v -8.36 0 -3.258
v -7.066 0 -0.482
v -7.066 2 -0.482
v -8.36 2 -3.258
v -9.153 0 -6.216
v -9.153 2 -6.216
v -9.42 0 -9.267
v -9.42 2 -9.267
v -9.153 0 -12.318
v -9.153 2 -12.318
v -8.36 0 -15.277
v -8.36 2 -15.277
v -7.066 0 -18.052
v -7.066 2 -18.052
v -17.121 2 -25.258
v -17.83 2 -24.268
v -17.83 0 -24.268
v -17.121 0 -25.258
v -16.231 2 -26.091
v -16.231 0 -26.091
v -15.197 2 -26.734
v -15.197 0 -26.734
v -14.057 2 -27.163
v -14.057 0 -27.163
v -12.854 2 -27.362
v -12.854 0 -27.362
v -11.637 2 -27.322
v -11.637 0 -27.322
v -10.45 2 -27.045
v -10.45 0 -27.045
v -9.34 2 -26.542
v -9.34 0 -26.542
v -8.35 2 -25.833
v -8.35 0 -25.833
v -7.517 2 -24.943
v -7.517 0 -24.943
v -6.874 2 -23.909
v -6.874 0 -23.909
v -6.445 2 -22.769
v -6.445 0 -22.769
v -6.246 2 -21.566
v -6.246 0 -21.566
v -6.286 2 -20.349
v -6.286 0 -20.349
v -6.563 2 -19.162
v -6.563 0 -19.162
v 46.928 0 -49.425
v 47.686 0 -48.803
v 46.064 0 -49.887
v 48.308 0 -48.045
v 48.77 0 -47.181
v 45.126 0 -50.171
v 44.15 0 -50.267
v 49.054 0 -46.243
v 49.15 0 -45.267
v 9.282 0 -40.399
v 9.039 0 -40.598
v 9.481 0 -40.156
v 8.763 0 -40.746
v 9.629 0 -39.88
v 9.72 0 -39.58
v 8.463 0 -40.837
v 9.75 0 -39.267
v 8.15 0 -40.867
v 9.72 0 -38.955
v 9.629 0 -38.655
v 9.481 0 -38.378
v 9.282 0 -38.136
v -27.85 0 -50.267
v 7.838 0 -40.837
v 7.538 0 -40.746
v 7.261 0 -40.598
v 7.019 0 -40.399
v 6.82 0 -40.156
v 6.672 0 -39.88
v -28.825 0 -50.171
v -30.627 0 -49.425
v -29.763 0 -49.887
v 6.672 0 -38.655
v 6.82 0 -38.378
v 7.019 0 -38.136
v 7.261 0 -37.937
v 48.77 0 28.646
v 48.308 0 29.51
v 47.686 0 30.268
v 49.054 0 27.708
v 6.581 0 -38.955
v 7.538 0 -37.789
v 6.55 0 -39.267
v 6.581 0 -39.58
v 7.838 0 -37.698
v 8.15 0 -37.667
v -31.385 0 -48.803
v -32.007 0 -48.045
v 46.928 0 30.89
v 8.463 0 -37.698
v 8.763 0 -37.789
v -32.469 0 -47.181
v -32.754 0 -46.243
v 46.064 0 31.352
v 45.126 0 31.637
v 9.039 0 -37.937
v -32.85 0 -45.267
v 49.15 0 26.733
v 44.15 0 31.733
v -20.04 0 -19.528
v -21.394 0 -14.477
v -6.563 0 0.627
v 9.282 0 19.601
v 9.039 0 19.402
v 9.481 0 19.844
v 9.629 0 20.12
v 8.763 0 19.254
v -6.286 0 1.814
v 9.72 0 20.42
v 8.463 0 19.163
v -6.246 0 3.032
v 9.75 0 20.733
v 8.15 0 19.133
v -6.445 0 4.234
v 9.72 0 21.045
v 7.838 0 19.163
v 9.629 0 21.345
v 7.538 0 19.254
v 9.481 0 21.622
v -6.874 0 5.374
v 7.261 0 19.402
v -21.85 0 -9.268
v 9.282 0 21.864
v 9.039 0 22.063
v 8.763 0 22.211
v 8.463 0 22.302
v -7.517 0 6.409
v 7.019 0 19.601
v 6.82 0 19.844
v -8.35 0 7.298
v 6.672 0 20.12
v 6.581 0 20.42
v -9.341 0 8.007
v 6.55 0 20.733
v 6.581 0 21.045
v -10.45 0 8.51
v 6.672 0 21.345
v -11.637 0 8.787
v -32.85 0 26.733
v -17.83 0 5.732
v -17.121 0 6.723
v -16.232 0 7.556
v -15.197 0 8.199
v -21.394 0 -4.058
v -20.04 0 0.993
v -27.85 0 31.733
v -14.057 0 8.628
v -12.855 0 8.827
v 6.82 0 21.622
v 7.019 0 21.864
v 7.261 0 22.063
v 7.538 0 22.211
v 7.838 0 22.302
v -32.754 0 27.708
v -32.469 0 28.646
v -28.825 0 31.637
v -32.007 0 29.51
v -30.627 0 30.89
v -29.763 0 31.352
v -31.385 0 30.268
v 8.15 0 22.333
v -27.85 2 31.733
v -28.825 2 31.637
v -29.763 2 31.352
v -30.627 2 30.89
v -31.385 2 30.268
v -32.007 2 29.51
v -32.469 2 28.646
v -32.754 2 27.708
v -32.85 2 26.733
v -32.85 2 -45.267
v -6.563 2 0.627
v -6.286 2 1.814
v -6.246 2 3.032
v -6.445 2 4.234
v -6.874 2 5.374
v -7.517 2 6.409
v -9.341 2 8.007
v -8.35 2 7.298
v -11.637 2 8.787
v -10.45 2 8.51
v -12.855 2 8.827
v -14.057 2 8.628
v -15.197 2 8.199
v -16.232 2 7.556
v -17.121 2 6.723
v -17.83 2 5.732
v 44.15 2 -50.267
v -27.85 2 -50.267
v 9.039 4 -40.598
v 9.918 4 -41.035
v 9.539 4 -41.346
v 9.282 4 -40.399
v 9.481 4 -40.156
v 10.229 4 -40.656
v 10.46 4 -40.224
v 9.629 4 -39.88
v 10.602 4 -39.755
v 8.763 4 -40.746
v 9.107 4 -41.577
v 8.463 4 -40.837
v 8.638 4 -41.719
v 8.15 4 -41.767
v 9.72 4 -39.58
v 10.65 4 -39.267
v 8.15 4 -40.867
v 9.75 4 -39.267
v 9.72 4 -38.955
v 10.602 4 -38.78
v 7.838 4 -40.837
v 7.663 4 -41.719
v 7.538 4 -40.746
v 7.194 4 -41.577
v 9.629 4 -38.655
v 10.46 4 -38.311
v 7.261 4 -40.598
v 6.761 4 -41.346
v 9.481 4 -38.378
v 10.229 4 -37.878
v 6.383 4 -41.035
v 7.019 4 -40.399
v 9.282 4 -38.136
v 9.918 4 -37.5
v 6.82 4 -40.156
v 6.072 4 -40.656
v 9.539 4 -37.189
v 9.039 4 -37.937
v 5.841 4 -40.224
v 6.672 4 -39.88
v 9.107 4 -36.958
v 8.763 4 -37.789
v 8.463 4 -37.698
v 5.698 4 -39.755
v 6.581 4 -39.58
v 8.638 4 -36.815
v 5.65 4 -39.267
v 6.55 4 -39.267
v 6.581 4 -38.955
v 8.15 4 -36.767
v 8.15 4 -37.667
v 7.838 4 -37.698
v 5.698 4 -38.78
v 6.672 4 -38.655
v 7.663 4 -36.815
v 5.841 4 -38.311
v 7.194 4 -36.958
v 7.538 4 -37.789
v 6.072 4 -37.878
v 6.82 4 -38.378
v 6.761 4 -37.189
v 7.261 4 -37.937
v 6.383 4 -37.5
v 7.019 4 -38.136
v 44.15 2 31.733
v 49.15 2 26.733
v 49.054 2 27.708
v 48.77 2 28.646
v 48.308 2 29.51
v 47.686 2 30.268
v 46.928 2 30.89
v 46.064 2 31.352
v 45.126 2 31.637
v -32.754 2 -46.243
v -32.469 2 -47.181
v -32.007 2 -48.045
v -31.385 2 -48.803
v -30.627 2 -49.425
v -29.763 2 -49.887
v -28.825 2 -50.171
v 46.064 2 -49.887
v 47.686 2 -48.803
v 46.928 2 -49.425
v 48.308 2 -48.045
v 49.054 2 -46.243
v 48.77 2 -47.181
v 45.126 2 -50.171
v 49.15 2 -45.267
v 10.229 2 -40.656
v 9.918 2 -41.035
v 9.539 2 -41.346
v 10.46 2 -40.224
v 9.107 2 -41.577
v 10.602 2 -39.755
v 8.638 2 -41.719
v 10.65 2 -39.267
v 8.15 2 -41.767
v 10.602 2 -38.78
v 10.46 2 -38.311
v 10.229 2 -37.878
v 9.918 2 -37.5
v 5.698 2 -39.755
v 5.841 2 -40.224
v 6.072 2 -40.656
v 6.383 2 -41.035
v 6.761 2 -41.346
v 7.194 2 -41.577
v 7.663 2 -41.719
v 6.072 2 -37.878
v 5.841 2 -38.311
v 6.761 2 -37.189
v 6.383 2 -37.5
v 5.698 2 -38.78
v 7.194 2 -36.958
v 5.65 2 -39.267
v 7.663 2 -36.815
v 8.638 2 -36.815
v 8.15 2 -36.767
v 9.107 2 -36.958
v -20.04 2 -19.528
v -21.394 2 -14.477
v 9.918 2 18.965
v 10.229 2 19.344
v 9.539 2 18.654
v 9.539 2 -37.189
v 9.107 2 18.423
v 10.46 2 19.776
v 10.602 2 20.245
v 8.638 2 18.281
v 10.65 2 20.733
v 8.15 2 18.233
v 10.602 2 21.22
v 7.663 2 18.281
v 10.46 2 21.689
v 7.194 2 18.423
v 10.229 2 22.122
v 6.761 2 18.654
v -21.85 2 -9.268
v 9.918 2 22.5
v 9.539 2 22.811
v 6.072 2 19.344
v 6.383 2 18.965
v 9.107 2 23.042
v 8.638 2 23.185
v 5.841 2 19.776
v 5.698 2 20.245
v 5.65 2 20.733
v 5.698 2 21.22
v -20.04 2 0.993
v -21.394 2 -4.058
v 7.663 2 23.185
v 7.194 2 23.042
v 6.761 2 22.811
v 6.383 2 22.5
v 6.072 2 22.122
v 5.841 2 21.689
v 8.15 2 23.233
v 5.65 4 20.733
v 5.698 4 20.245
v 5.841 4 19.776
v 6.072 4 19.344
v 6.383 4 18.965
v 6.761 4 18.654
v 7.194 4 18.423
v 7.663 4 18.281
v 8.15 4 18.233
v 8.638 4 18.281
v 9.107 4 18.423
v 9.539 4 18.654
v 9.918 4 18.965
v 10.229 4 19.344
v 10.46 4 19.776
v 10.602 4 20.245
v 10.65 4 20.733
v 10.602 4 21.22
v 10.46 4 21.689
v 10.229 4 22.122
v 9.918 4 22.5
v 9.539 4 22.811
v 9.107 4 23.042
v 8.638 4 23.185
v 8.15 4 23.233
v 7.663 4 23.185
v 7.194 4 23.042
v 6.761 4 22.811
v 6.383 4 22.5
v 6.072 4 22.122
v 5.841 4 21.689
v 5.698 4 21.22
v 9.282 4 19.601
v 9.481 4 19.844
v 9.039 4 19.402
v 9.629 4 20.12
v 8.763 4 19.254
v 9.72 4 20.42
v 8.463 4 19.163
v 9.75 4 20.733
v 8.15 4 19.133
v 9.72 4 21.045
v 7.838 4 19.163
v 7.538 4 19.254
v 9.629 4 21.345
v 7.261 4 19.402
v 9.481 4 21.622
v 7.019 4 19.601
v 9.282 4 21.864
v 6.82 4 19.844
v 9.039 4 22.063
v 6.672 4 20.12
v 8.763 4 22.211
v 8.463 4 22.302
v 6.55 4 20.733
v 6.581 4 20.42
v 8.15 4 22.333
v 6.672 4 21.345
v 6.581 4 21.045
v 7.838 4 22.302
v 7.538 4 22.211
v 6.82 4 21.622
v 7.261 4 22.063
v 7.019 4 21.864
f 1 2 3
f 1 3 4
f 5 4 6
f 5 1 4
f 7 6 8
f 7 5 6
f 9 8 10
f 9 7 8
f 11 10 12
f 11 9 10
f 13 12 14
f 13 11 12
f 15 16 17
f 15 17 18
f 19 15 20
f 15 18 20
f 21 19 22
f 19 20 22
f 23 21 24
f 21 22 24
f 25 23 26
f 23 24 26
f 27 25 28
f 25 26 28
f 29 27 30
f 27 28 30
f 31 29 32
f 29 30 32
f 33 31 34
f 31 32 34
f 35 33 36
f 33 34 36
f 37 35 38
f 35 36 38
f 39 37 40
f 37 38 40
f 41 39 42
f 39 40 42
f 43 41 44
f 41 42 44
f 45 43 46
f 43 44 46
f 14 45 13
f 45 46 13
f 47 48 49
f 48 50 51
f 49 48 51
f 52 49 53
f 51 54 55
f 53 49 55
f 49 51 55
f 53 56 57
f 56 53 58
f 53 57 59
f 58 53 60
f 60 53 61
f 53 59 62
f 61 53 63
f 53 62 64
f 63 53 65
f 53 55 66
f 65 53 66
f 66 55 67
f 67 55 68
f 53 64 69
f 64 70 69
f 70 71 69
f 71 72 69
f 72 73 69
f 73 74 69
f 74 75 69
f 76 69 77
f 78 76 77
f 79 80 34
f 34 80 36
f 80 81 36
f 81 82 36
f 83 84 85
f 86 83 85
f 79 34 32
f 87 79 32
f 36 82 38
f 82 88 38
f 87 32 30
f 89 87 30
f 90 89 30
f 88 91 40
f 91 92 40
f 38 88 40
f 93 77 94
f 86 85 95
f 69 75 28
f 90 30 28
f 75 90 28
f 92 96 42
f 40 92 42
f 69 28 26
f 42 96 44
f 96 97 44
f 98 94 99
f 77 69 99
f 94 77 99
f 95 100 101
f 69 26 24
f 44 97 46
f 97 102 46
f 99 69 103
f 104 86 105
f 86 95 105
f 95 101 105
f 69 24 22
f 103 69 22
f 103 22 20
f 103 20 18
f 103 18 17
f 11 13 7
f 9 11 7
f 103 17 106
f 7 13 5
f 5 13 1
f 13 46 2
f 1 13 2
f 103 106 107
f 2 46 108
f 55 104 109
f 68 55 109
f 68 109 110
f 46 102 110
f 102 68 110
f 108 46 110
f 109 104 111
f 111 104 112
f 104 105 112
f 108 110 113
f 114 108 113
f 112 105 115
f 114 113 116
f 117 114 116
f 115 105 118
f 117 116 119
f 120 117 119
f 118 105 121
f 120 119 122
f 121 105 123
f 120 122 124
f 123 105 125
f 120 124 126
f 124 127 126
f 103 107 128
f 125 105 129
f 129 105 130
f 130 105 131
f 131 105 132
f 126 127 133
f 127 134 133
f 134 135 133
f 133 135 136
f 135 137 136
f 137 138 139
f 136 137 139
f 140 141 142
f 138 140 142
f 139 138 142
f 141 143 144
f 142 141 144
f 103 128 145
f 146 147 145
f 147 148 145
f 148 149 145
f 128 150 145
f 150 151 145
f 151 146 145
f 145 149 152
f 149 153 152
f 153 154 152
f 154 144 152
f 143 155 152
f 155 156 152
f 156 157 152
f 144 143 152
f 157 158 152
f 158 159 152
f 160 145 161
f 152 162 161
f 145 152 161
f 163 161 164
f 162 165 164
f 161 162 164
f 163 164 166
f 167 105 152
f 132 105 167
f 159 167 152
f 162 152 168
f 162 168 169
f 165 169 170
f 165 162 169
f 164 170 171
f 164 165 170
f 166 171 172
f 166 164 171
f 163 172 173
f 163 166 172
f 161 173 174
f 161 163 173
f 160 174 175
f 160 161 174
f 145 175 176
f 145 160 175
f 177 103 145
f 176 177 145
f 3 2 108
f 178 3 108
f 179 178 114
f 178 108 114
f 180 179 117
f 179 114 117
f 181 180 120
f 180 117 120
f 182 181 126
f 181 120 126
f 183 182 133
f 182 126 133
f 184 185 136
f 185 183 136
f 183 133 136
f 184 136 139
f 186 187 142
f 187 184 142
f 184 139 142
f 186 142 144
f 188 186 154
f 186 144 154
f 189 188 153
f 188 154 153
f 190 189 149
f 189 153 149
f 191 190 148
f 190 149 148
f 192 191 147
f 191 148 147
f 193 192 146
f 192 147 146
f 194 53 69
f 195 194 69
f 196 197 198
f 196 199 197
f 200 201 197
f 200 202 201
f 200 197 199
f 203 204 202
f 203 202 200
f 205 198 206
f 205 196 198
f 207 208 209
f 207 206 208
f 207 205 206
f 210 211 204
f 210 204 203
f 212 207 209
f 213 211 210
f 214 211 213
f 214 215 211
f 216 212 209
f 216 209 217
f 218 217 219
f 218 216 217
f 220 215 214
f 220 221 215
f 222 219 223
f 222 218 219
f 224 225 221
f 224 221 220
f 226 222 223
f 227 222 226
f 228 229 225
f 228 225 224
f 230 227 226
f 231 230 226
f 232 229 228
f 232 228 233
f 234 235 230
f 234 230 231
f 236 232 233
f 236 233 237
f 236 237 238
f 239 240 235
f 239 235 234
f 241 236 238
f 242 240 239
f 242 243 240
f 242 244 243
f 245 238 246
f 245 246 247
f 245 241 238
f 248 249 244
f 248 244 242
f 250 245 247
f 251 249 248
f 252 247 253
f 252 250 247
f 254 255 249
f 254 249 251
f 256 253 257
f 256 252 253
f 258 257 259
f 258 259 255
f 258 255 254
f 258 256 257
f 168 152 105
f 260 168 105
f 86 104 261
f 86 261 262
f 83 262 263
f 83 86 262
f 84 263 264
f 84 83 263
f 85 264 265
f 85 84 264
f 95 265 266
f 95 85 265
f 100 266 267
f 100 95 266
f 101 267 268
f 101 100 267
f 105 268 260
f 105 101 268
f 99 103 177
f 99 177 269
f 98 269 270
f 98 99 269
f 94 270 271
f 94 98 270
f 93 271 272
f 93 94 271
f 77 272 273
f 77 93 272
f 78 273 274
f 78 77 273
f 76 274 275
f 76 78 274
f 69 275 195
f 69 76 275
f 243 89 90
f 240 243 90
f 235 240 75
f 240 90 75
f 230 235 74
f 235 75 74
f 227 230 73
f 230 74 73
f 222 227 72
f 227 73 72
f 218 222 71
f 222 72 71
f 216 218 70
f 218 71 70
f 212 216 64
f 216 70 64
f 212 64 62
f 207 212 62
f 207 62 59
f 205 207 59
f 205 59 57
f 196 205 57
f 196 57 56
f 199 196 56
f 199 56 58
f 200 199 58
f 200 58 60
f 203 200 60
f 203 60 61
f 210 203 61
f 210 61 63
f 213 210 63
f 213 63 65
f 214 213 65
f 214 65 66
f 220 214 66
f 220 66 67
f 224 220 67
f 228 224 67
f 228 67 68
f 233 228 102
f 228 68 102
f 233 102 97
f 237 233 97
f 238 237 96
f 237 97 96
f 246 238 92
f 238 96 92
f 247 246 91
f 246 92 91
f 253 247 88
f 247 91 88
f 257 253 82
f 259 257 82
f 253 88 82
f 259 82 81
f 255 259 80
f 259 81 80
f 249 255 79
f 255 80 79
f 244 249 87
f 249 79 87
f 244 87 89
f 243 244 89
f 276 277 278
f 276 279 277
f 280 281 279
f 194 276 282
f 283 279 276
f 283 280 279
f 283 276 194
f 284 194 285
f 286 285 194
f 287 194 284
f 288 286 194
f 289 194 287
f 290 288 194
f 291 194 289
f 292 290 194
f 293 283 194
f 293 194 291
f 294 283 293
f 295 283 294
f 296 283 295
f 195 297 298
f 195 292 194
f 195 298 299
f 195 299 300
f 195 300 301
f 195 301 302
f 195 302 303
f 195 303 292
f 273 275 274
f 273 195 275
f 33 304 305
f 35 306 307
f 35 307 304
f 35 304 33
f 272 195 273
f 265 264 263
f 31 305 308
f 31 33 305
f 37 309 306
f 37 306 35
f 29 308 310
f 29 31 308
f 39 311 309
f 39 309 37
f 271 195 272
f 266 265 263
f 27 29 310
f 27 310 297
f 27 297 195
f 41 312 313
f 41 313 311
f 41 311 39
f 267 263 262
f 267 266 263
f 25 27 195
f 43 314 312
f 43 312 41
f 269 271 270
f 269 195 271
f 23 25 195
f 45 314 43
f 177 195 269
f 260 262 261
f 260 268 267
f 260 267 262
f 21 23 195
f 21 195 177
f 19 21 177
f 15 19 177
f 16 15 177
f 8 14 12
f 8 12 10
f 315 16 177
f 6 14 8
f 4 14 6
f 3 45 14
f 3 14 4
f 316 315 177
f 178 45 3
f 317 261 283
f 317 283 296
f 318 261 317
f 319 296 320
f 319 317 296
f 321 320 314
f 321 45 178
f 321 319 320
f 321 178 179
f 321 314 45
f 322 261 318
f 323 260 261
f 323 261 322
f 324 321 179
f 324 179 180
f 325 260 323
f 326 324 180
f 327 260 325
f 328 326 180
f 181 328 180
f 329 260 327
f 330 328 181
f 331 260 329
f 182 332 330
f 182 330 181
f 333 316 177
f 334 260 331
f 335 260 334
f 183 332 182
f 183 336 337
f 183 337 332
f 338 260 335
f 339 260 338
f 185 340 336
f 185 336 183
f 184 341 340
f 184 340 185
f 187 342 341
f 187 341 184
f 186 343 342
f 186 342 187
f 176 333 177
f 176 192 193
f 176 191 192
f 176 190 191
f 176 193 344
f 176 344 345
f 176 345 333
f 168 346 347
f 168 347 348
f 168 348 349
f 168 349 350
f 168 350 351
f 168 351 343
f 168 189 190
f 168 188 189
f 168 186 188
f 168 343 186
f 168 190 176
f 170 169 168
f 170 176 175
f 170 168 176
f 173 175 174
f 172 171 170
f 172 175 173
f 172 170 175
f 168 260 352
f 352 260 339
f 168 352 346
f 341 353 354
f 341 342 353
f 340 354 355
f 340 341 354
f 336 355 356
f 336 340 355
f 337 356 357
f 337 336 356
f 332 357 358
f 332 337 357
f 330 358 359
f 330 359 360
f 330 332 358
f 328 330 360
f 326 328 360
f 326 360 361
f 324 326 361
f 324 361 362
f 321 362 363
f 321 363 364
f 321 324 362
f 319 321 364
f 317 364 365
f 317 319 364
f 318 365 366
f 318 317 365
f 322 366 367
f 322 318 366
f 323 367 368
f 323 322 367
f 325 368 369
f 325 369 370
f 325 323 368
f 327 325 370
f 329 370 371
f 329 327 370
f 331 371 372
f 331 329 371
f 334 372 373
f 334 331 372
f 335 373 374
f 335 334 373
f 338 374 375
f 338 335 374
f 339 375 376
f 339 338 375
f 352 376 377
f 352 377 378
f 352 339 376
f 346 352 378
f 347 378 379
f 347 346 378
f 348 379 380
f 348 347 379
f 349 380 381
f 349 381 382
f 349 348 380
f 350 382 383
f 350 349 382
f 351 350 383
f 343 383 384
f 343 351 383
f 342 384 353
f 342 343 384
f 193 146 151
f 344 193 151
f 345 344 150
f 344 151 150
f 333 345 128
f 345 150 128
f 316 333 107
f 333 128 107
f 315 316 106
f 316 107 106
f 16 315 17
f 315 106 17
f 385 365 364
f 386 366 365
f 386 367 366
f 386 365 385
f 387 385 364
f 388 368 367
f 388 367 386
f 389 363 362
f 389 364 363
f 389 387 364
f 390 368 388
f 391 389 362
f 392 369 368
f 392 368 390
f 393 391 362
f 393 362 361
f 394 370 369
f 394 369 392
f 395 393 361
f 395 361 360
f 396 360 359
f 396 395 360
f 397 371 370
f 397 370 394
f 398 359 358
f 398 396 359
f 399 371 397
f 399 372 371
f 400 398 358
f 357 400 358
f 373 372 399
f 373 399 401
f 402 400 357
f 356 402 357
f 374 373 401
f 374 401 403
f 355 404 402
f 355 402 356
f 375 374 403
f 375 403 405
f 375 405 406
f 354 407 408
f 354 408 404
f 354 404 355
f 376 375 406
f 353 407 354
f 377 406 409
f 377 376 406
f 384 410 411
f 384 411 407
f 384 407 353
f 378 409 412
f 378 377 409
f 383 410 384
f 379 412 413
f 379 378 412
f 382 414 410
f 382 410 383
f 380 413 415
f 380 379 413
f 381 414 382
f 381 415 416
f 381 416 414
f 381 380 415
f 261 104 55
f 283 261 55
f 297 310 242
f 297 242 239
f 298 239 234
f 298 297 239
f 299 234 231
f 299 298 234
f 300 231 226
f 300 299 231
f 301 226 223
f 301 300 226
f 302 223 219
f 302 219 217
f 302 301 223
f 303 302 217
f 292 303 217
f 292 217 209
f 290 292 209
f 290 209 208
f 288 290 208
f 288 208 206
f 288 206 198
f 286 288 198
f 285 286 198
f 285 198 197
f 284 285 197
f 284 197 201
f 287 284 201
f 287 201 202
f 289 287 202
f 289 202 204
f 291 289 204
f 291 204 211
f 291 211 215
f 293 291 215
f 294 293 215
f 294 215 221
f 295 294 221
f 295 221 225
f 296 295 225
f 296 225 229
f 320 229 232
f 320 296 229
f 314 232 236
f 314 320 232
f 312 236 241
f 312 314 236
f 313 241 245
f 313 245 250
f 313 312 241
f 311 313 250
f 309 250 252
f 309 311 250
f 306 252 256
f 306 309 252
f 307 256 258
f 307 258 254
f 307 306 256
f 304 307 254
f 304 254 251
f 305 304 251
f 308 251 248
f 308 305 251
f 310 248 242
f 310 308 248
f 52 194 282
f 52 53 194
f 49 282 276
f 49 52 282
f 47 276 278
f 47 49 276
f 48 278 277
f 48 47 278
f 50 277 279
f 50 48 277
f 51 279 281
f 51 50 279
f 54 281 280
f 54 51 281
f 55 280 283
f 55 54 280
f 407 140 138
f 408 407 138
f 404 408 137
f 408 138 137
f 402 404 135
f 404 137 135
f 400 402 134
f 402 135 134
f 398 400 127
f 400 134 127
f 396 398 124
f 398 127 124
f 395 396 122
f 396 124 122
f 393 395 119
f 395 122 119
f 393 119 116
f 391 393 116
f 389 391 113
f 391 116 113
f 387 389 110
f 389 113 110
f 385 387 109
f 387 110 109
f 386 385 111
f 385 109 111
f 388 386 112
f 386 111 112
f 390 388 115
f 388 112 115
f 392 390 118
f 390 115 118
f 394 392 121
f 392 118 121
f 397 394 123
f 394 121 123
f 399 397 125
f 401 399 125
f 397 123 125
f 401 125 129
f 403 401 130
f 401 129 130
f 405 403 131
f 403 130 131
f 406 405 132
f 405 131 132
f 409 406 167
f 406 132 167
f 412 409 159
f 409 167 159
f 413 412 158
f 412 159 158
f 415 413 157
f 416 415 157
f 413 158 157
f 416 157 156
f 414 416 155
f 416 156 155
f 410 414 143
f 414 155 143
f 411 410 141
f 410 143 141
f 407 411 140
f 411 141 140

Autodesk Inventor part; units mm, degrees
ref_plane "YZ Plane" through (0, 0, 0) normal (1, 0, 0) x (0, 1, 0)
ref_plane "XZ Plane" through (0, 0, 0) normal (0, 1, 0) x (-1, 0, 0)
ref_plane "XY Plane" through (0, 0, 0) normal (0, 0, 1) x (1, 0, 0)
sketch "Sketch1" plane through (0, 0, 0) normal (0, 1, 0) x (-1, 0, 0)
  line L0 (32.8496, 31.7326) -> (-49.1504, 31.7326)
  line L1 (-49.1504, 31.7326) -> (-49.1504, -50.2674)
  line L2 (-49.1504, -50.2674) -> (32.8496, -50.2674)
  line L3 (32.8496, -50.2674) -> (32.8496, 31.7326)
  circle A0 centre (-8.1504, -9.2674) radius 30
  circle A1 centre (-8.1504, -39.2674) radius 2.5
  circle A2 centre (-8.1504, 20.7326) radius 2.5
  circle A3 centre (-8.1504, -39.2674) radius 1.6
  circle A4 centre (-8.1504, 20.7326) radius 1.6
  arc A5 (12.448, -21.16) -> (12.4481, 2.625) centre (-8.1504, -9.2674) ccw construction
  arc A6 (17.8304, -24.2675) -> (17.8305, 5.7325) centre (-8.1504, -9.2674) ccw
  arc A7 (7.0656, -18.0524) -> (7.0657, -0.4825) centre (-8.1504, -9.2674) ccw
  arc A8 (7.0656, -18.0524) -> (17.8304, -24.2675) centre (12.448, -21.16) ccw
  arc A9 (17.8305, 5.7325) -> (7.0657, -0.4825) centre (12.4481, 2.625) ccw
  line L4 (-8.1504, -9.2674) -> (12.448, -21.16) construction
  line L5 (-8.1504, -9.2674) -> (12.4481, 2.625) construction
  point P0 (0, 0)
  point P1 (17.8304, -24.2675)
  point P2 (17.8305, 5.7325)
  dimension "d0" = 82
  dimension "d1" = 82
  dimension "d2" = 60
  dimension "d3" = 5
  dimension "d4" = 5
  dimension "d5" = 3.2
  dimension "d6" = 3.2
  dimension "d7" = 60
extrude "Extrusion1" add sketch "Sketch1" along normal blind 2 contours L3 L2 L1 L0 | A9 A7 A8 A0 A1 A2
extrude "Extrusion2" add sketch "Sketch1" along normal blind 4 contours A2 A0 A4 | A0 A4 A2 | A1 A0 A3 | A0 A3 A1
sketch "Sketch2" plane through (0, 2, 0) normal (0, 1, 0) x (1, 0, 0)
  line L0 (49.1504, -31.7326) -> (49.1504, 50.2674) projected
  line L1 (49.1504, 50.2674) -> (-32.8496, 50.2674) projected
  line L2 (-32.8496, 50.2674) -> (-32.8496, -31.7326) projected
  line L3 (-32.8496, -31.7326) -> (49.1504, -31.7326) projected
  circle A0 centre (8.1504, -20.7326) radius 2.5 projected
  circle A1 centre (8.1504, 39.2674) radius 2.5 projected
  arc A2 (-7.0656, 18.0524) -> (-17.8304, 24.2675) centre (-12.448, 21.16) ccw projected
  arc A3 (-7.0656, 18.0524) -> (-7.0657, 0.4825) centre (8.1504, 9.2674) ccw projected
  arc A4 (-17.8305, -5.7325) -> (-7.0657, 0.4825) centre (-12.4481, -2.625) ccw projected
  arc A5 (-17.8304, 24.2675) -> (-17.8305, -5.7325) centre (8.1504, 9.2674) ccw projected
  circle A6 centre (-27.8496, 45.2674) radius 5
  circle A7 centre (-27.8496, -26.7326) radius 5
  circle A8 centre (44.1504, 45.2674) radius 5
  circle A9 centre (44.1504, -26.7326) radius 5
  point P0 (0, 0)
  point P1 (-27.8496, -31.7326)
  point P2 (-32.8496, -26.7326)
  point P3 (49.1504, -26.7326)
  point P4 (44.1504, -31.7326)
  point P5 (44.1504, 50.2674)
  point P6 (49.1504, 45.2674)
  point P7 (-32.8496, 45.2674)
  point P8 (-27.8496, 50.2674)
  dimension "d12" = 10
  dimension "d13" = 0
  dimension "d14" = 0
  dimension "d15" = 10
  dimension "d16" = 0
  dimension "d17" = 10
  dimension "d18" = 0
  dimension "d19" = 10
extrude "Extrusion3" cut sketch "Sketch2" along normal mid plane 4 contours L3 A9 L0 | A8 L1 L0 | L3 L2 A7 | A6 L2 L1
sketch "Sketch3" plane through (0, 2, 0) normal (0, 1, 0) x (1, 0, 0)
  line L0 (44.1504, 50.2674) -> (-27.8496, 50.2674) projected
  line L1 (-27.8496, -31.7326) -> (44.1504, -31.7326) projected
  point P0 (0, 0)
  dimension "d22" = 82
properties part number "controler_01"
